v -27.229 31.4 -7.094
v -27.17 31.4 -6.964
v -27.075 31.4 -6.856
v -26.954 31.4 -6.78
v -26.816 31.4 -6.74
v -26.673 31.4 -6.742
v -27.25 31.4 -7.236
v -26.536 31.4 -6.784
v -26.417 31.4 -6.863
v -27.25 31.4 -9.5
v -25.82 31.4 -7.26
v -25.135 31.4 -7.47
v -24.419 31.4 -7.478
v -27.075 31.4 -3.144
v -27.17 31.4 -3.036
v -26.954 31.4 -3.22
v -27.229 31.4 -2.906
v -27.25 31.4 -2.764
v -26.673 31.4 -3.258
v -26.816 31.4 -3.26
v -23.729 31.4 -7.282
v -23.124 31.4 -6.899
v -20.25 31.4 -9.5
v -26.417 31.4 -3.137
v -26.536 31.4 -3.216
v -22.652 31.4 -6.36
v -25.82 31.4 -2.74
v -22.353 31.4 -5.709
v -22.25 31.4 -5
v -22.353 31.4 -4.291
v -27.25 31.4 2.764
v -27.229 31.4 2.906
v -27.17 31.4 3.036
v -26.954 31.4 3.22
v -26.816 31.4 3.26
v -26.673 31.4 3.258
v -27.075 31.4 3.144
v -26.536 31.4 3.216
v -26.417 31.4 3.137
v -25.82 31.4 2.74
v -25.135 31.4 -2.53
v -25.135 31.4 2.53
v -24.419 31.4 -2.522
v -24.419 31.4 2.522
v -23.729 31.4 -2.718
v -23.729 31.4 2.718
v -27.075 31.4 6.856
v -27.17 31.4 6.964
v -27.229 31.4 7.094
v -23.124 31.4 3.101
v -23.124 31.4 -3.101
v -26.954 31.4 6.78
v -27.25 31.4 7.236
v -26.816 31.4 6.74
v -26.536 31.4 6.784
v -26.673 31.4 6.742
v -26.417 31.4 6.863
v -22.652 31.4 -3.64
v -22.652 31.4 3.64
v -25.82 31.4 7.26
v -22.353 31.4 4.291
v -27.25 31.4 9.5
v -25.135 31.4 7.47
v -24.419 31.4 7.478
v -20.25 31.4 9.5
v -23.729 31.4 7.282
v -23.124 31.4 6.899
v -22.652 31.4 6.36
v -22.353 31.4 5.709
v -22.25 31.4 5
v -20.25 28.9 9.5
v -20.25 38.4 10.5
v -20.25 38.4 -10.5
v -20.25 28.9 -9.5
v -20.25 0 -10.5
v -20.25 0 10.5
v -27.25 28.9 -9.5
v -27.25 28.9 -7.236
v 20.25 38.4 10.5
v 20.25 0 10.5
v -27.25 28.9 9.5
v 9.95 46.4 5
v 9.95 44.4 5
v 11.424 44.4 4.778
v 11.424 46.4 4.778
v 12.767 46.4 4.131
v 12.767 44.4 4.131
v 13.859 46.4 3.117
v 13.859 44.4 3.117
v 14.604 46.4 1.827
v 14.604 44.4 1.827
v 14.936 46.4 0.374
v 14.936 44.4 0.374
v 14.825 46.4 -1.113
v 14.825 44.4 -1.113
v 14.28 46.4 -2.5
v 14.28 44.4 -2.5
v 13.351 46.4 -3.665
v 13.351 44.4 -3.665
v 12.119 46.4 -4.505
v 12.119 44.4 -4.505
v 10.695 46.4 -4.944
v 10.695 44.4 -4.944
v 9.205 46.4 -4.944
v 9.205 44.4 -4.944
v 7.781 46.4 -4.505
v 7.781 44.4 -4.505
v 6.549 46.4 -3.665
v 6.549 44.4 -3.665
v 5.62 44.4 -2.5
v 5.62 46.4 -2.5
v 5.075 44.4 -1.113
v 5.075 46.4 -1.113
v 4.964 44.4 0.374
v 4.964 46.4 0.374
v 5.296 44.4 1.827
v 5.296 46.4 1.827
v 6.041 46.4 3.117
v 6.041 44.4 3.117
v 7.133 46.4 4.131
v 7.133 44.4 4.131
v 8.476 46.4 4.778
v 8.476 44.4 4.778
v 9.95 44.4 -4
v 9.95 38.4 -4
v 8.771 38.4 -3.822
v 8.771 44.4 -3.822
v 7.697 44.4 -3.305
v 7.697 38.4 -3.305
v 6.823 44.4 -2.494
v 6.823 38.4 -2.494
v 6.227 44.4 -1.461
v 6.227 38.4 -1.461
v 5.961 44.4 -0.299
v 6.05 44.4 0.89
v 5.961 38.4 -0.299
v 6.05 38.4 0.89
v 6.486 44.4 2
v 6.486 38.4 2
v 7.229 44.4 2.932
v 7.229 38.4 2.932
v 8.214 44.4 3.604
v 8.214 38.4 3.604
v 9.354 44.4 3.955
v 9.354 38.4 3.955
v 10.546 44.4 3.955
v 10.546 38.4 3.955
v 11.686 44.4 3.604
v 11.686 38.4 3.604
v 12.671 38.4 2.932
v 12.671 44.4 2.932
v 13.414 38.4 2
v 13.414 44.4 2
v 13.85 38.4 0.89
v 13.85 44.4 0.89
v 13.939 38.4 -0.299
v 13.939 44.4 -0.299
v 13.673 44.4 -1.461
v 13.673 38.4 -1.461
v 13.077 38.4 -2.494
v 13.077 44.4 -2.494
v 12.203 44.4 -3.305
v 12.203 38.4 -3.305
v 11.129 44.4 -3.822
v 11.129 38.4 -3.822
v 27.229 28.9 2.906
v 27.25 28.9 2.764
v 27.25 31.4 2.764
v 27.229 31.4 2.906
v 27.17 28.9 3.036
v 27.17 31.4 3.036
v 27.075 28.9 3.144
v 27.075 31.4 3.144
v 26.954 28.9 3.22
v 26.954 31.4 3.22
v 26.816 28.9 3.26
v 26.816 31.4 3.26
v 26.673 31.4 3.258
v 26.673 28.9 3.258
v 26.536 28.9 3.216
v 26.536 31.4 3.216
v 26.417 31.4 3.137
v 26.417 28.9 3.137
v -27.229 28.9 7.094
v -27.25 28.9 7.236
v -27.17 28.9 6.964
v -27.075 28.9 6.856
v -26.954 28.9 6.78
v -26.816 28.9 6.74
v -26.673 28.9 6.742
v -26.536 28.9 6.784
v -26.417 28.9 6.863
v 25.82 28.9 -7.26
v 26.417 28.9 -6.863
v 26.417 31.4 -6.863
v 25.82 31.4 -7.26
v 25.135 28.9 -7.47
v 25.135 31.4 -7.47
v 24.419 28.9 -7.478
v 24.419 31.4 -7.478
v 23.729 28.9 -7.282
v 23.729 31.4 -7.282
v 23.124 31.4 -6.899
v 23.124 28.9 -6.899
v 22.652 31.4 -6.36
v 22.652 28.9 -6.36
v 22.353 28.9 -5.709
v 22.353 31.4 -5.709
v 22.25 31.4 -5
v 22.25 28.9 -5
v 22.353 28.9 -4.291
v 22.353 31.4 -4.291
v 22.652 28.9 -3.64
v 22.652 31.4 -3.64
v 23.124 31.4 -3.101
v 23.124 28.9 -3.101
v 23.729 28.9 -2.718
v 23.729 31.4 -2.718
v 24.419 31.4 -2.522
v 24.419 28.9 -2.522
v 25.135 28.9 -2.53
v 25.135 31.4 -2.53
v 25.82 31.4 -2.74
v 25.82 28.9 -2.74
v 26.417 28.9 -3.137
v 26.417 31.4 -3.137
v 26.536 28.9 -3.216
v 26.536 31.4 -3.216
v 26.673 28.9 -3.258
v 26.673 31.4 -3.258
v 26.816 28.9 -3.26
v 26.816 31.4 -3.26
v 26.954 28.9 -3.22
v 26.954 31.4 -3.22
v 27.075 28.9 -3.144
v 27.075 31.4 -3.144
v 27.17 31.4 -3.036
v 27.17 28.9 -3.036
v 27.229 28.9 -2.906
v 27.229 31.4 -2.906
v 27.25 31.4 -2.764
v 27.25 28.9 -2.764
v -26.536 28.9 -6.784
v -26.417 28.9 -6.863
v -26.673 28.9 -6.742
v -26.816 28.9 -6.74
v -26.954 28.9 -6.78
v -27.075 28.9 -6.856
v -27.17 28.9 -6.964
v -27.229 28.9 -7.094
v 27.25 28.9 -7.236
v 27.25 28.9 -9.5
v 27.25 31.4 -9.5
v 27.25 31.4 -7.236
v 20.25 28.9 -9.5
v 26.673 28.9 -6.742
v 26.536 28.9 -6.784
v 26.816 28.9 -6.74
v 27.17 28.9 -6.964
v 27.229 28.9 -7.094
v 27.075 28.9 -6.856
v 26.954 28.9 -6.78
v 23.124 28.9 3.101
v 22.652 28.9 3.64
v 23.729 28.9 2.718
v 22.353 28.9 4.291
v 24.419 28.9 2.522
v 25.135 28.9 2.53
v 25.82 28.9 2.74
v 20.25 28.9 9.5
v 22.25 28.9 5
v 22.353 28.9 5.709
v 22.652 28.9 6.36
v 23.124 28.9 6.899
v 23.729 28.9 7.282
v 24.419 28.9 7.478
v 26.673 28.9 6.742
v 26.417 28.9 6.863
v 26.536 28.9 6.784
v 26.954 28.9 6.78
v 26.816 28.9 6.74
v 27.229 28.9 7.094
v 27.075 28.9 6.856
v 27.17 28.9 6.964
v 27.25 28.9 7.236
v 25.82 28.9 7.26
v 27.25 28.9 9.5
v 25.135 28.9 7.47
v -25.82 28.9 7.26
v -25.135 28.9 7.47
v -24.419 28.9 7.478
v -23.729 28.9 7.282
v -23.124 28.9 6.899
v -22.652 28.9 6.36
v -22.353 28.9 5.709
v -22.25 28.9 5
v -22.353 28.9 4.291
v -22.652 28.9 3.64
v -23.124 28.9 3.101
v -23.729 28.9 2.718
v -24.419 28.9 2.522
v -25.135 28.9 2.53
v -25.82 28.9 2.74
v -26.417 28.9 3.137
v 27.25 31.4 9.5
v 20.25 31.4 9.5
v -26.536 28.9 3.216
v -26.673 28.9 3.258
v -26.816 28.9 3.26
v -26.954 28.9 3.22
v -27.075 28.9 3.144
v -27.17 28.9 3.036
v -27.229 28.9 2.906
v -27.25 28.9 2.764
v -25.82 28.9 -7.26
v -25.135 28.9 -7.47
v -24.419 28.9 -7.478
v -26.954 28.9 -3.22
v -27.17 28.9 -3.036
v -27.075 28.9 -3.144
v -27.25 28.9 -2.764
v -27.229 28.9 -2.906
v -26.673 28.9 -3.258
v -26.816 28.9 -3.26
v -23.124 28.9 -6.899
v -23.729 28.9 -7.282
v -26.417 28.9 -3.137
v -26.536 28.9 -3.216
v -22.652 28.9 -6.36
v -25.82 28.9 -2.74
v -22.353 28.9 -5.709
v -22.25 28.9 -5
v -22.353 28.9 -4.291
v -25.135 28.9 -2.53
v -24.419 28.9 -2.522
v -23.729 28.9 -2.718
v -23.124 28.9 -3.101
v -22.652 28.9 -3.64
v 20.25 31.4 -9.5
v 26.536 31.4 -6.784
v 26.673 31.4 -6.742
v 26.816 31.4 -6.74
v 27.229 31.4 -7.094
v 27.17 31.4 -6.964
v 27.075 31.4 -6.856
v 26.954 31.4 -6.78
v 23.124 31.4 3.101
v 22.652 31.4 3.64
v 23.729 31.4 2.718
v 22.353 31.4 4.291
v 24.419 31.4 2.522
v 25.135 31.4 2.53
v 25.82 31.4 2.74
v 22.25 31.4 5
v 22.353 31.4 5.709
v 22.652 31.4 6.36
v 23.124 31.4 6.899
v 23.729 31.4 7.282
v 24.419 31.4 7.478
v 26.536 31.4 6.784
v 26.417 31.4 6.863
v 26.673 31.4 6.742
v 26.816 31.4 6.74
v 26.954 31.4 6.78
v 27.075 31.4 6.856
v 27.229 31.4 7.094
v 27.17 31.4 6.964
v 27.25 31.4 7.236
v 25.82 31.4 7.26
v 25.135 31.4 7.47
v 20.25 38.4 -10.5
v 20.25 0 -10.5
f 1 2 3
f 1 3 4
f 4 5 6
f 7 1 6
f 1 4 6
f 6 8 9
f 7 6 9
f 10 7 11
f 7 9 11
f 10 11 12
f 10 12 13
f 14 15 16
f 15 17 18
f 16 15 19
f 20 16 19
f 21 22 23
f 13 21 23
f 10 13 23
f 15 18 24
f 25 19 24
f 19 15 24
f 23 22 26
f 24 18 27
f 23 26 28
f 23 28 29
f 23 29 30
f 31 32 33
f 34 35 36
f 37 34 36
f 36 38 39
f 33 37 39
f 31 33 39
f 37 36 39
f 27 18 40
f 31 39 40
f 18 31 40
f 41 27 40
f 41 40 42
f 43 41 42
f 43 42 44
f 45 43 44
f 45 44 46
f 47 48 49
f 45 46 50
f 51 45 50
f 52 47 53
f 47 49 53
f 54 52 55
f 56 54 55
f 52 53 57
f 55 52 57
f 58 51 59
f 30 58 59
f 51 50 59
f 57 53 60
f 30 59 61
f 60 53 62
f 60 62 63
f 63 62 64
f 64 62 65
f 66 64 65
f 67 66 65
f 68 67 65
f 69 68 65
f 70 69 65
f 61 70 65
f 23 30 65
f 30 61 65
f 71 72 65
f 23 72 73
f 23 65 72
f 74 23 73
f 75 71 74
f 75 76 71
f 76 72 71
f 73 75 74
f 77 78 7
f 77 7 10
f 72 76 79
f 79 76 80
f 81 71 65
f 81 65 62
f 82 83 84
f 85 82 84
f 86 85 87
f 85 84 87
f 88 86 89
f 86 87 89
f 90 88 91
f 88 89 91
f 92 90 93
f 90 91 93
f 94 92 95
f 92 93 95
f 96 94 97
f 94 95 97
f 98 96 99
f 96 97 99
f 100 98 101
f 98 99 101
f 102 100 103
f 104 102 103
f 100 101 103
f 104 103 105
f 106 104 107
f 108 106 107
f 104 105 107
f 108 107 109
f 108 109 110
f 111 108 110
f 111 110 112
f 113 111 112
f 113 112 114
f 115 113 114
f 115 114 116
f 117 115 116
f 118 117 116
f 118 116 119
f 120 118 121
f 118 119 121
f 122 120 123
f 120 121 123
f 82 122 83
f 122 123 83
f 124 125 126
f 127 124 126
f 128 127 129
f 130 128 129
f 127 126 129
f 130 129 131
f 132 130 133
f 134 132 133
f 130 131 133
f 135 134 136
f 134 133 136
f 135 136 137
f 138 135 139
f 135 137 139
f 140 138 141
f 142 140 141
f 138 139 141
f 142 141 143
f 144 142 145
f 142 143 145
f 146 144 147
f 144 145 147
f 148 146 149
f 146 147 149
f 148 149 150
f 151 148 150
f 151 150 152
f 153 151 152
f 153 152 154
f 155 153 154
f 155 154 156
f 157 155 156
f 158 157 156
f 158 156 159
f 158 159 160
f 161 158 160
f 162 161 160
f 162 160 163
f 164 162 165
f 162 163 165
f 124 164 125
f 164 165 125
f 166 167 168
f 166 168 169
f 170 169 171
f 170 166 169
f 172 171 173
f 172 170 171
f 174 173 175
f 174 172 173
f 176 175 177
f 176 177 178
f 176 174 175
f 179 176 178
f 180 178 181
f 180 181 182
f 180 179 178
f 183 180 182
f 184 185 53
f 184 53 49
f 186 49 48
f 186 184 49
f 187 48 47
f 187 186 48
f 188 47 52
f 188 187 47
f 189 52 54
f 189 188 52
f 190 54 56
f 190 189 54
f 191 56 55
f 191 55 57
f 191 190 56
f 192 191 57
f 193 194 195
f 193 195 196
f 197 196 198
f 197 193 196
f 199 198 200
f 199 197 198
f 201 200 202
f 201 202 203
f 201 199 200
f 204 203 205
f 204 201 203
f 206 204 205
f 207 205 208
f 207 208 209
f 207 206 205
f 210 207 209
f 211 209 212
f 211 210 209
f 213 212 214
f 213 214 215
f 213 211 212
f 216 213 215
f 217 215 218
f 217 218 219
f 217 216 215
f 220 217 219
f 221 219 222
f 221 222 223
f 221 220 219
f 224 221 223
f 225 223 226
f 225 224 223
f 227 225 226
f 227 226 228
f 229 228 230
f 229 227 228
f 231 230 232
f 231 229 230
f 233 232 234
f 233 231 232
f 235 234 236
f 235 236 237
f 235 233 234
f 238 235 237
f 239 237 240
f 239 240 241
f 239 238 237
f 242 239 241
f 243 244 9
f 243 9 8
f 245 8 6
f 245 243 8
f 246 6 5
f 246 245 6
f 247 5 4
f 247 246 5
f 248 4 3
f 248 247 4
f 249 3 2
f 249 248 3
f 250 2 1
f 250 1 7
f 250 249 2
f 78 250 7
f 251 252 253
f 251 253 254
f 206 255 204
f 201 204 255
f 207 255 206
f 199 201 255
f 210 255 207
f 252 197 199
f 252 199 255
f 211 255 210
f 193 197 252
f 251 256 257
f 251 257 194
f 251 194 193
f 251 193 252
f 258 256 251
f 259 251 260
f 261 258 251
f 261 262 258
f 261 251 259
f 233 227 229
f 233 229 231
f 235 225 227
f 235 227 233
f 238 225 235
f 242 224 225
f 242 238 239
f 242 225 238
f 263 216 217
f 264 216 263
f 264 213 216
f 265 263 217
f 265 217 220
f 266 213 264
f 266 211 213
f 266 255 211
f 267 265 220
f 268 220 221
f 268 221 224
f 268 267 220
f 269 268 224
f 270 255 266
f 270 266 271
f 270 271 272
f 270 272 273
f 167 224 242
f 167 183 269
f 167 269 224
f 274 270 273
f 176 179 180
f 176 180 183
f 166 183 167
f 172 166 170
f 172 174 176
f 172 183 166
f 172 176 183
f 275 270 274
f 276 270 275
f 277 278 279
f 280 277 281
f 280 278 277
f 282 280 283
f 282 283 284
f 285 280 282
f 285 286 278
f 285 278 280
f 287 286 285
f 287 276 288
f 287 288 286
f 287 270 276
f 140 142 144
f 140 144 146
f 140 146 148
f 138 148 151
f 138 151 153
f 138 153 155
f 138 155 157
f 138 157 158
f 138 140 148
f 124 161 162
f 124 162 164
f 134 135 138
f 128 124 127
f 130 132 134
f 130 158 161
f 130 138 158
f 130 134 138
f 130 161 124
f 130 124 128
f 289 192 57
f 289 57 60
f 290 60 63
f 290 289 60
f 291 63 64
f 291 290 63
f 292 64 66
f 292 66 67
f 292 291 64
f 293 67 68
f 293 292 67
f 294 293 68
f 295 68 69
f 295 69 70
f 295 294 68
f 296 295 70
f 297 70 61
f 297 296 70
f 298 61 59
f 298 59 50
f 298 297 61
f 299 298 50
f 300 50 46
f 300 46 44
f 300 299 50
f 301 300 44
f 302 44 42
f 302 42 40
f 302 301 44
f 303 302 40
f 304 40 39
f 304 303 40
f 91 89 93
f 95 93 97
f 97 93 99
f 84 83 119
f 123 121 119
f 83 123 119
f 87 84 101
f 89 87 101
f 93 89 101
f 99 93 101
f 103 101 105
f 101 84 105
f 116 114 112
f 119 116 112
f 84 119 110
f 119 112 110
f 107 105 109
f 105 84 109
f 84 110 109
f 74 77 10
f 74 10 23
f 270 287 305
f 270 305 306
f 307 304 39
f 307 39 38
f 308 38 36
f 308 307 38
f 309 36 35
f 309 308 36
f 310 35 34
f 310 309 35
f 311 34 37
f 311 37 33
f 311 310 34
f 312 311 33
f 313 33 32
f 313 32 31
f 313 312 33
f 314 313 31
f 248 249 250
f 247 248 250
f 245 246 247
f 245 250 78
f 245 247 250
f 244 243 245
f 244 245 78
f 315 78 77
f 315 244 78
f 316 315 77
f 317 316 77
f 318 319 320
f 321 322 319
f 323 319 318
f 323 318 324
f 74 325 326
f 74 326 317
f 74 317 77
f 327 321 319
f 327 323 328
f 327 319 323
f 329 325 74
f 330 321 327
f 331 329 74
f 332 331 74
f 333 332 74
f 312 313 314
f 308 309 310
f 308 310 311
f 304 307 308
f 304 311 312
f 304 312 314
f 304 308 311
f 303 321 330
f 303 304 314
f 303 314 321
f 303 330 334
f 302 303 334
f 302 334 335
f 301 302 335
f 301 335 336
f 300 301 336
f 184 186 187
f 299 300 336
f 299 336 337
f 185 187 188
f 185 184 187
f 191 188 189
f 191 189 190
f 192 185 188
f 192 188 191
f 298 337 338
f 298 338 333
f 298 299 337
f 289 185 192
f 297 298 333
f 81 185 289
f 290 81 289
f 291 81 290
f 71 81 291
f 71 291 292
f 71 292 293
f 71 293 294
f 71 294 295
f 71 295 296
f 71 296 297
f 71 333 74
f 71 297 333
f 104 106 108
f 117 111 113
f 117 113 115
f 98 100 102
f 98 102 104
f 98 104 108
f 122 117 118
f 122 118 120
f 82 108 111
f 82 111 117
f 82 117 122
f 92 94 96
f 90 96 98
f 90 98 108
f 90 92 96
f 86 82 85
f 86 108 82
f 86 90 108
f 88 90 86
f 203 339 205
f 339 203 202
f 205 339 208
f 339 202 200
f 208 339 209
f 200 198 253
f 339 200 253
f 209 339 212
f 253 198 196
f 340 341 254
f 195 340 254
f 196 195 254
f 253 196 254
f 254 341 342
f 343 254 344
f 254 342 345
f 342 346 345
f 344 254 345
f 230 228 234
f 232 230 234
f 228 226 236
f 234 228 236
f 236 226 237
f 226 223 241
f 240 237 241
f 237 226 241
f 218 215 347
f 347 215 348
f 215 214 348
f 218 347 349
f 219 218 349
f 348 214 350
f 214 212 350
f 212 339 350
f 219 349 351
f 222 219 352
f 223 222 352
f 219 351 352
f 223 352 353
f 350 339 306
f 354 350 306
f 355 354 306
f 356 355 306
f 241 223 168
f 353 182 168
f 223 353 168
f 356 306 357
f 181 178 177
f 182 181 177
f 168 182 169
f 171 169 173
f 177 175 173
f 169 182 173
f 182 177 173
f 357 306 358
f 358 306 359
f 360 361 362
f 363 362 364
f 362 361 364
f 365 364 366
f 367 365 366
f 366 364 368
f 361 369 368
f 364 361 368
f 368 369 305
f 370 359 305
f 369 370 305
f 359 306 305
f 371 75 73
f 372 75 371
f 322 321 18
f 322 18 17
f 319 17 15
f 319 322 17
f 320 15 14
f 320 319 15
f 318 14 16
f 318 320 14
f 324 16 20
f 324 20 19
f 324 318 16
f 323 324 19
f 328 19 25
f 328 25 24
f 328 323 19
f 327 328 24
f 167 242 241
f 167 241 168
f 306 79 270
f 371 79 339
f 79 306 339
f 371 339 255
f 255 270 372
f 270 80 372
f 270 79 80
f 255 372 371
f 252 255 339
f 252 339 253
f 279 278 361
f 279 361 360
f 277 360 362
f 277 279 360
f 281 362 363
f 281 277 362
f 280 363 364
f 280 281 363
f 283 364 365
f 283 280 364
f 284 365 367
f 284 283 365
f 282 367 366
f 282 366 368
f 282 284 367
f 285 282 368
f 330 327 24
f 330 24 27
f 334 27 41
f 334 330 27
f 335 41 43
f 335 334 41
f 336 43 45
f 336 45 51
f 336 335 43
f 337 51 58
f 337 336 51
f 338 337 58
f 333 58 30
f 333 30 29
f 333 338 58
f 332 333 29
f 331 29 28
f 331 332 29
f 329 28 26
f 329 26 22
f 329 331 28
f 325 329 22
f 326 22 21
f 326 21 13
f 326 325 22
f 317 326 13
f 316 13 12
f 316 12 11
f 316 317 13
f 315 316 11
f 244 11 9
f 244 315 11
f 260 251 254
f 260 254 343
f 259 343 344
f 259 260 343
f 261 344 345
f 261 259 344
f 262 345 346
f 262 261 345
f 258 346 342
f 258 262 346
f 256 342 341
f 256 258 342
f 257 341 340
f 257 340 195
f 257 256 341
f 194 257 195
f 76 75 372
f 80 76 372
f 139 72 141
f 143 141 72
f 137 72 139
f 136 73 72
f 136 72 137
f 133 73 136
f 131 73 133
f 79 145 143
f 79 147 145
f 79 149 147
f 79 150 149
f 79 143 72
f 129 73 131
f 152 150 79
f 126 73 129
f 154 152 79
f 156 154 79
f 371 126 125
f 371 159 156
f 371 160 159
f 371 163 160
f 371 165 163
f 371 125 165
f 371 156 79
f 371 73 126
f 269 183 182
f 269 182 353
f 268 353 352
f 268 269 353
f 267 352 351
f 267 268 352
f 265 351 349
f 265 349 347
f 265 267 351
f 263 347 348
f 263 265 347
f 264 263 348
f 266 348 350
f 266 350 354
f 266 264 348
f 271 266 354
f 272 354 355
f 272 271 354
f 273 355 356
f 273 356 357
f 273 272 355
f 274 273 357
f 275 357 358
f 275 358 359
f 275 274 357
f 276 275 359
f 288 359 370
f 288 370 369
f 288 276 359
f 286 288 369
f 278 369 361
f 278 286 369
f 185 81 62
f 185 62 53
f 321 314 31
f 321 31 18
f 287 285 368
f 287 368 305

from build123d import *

# Parameters (mm, degrees)
SKETCH1_W           = 40.5
SKETCH1_H           = 21
BOSS_EXTRUDE1_DEPTH = 38.4
SKETCH2_R           = 4
BOSS_EXTRUDE2_DEPTH = 6
SKETCH3_R           = 5
SKETCH3_R_2         = 4
BOSS_EXTRUDE3_DEPTH = 2
BOSS_EXTRUDE5_START = 15.5
BOSS_EXTRUDE5_DEPTH = 2.5


with BuildPart() as part:
    # Sketch1 → Boss-Extrude1 (new body)
    with BuildSketch(Plane(origin=(0, 0, 0), x_dir=(1, 0, 0), z_dir=(0, 1, 0))):
        Rectangle(SKETCH1_W, SKETCH1_H)
    extrude(amount=BOSS_EXTRUDE1_DEPTH)

    # Sketch2 → Boss-Extrude2 (add)
    with BuildSketch(Plane(origin=(0, 38.4, 0), x_dir=(1, 0, 0), z_dir=(0, 1, 0))):
        with Locations(Location((9.95, 0, 0), (0, 0, 90))):
            Circle(SKETCH2_R)
    extrude(amount=BOSS_EXTRUDE2_DEPTH)

    # Sketch6 → Boss-Extrude5 (add)
    with BuildSketch(Plane.XZ.offset(-44.4).offset(BOSS_EXTRUDE5_START)):
        with BuildLine():
            Line((-27.25, -7.236067977), (-27.25, -9.5))
            Line((-27.25, -9.5), (27.25, -9.5))
            Line((27.25, -9.5), (27.25, -7.236067977))
            ThreePointArc((27.25, -7.236067977), (26.954124145, -6.779632513), (26.416666667, -6.863389981))
            ThreePointArc((26.416666667, -6.863389981), (22.25, -5), (26.416666667, -3.136610019))
            ThreePointArc((26.416666667, -3.136610019), (26.954124145, -3.220367487), (27.25, -2.763932023))
            Line((27.25, -2.763932023), (27.25, 2.763932023))
            ThreePointArc((27.25, 2.763932023), (26.954124145, 3.220367487), (26.416666667, 3.136610019))
            ThreePointArc((26.416666667, 3.136610019), (22.25, 5), (26.416666667, 6.863389981))
            ThreePointArc((26.416666667, 6.863389981), (26.954124145, 6.779632513), (27.25, 7.236067977))
            Line((27.25, 7.236067977), (27.25, 9.5))
            Line((27.25, 9.5), (-27.25, 9.5))
            Line((-27.25, 9.5), (-27.25, 7.236067977))
            ThreePointArc((-27.25, 7.236067977), (-26.954124145, 6.779632513), (-26.416666667, 6.863389981))
            ThreePointArc((-26.416666667, 6.863389981), (-22.25, 5), (-26.416666667, 3.136610019))
            ThreePointArc((-26.416666667, 3.136610019), (-26.954124145, 3.220367487), (-27.25, 2.763932023))
            Line((-27.25, 2.763932023), (-27.25, -2.763932023))
            ThreePointArc((-27.25, -2.763932023), (-26.954124145, -3.220367487), (-26.416666667, -3.136610019))
            ThreePointArc((-26.416666667, -3.136610019), (-22.25, -5), (-26.416666667, -6.863389981))
            ThreePointArc((-26.416666667, -6.863389981), (-26.954124145, -6.779632513), (-27.25, -7.236067977))
        make_face()
    extrude(amount=-BOSS_EXTRUDE5_DEPTH)


with BuildPart() as body_2:
    # Sketch3 → Boss-Extrude3 (new body)
    # profile 1 of 2: a face of its own
    with BuildSketch(Plane(origin=(0, 44.4, 0), x_dir=(1, 0, 0), z_dir=(0, 1, 0))):
        with Locations(Location((9.95, 0, 0), (0, 0, 270))):
            Circle(SKETCH3_R)
        with Locations(Location((9.95, 0, 0), (0, 0, 90))):
            Circle(SKETCH3_R_2, mode=Mode.SUBTRACT)
    # profile 2 of 2: a face of its own
    with BuildSketch(Plane(origin=(0, 44.4, 0), x_dir=(1, 0, 0), z_dir=(0, 1, 0))):
        with Locations(Location((9.95, 0, 0), (0, 0, 90))):
            Circle(SKETCH3_R_2)
    extrude(amount=BOSS_EXTRUDE3_DEPTH)


solid = Compound([part.part, body_2.part])
